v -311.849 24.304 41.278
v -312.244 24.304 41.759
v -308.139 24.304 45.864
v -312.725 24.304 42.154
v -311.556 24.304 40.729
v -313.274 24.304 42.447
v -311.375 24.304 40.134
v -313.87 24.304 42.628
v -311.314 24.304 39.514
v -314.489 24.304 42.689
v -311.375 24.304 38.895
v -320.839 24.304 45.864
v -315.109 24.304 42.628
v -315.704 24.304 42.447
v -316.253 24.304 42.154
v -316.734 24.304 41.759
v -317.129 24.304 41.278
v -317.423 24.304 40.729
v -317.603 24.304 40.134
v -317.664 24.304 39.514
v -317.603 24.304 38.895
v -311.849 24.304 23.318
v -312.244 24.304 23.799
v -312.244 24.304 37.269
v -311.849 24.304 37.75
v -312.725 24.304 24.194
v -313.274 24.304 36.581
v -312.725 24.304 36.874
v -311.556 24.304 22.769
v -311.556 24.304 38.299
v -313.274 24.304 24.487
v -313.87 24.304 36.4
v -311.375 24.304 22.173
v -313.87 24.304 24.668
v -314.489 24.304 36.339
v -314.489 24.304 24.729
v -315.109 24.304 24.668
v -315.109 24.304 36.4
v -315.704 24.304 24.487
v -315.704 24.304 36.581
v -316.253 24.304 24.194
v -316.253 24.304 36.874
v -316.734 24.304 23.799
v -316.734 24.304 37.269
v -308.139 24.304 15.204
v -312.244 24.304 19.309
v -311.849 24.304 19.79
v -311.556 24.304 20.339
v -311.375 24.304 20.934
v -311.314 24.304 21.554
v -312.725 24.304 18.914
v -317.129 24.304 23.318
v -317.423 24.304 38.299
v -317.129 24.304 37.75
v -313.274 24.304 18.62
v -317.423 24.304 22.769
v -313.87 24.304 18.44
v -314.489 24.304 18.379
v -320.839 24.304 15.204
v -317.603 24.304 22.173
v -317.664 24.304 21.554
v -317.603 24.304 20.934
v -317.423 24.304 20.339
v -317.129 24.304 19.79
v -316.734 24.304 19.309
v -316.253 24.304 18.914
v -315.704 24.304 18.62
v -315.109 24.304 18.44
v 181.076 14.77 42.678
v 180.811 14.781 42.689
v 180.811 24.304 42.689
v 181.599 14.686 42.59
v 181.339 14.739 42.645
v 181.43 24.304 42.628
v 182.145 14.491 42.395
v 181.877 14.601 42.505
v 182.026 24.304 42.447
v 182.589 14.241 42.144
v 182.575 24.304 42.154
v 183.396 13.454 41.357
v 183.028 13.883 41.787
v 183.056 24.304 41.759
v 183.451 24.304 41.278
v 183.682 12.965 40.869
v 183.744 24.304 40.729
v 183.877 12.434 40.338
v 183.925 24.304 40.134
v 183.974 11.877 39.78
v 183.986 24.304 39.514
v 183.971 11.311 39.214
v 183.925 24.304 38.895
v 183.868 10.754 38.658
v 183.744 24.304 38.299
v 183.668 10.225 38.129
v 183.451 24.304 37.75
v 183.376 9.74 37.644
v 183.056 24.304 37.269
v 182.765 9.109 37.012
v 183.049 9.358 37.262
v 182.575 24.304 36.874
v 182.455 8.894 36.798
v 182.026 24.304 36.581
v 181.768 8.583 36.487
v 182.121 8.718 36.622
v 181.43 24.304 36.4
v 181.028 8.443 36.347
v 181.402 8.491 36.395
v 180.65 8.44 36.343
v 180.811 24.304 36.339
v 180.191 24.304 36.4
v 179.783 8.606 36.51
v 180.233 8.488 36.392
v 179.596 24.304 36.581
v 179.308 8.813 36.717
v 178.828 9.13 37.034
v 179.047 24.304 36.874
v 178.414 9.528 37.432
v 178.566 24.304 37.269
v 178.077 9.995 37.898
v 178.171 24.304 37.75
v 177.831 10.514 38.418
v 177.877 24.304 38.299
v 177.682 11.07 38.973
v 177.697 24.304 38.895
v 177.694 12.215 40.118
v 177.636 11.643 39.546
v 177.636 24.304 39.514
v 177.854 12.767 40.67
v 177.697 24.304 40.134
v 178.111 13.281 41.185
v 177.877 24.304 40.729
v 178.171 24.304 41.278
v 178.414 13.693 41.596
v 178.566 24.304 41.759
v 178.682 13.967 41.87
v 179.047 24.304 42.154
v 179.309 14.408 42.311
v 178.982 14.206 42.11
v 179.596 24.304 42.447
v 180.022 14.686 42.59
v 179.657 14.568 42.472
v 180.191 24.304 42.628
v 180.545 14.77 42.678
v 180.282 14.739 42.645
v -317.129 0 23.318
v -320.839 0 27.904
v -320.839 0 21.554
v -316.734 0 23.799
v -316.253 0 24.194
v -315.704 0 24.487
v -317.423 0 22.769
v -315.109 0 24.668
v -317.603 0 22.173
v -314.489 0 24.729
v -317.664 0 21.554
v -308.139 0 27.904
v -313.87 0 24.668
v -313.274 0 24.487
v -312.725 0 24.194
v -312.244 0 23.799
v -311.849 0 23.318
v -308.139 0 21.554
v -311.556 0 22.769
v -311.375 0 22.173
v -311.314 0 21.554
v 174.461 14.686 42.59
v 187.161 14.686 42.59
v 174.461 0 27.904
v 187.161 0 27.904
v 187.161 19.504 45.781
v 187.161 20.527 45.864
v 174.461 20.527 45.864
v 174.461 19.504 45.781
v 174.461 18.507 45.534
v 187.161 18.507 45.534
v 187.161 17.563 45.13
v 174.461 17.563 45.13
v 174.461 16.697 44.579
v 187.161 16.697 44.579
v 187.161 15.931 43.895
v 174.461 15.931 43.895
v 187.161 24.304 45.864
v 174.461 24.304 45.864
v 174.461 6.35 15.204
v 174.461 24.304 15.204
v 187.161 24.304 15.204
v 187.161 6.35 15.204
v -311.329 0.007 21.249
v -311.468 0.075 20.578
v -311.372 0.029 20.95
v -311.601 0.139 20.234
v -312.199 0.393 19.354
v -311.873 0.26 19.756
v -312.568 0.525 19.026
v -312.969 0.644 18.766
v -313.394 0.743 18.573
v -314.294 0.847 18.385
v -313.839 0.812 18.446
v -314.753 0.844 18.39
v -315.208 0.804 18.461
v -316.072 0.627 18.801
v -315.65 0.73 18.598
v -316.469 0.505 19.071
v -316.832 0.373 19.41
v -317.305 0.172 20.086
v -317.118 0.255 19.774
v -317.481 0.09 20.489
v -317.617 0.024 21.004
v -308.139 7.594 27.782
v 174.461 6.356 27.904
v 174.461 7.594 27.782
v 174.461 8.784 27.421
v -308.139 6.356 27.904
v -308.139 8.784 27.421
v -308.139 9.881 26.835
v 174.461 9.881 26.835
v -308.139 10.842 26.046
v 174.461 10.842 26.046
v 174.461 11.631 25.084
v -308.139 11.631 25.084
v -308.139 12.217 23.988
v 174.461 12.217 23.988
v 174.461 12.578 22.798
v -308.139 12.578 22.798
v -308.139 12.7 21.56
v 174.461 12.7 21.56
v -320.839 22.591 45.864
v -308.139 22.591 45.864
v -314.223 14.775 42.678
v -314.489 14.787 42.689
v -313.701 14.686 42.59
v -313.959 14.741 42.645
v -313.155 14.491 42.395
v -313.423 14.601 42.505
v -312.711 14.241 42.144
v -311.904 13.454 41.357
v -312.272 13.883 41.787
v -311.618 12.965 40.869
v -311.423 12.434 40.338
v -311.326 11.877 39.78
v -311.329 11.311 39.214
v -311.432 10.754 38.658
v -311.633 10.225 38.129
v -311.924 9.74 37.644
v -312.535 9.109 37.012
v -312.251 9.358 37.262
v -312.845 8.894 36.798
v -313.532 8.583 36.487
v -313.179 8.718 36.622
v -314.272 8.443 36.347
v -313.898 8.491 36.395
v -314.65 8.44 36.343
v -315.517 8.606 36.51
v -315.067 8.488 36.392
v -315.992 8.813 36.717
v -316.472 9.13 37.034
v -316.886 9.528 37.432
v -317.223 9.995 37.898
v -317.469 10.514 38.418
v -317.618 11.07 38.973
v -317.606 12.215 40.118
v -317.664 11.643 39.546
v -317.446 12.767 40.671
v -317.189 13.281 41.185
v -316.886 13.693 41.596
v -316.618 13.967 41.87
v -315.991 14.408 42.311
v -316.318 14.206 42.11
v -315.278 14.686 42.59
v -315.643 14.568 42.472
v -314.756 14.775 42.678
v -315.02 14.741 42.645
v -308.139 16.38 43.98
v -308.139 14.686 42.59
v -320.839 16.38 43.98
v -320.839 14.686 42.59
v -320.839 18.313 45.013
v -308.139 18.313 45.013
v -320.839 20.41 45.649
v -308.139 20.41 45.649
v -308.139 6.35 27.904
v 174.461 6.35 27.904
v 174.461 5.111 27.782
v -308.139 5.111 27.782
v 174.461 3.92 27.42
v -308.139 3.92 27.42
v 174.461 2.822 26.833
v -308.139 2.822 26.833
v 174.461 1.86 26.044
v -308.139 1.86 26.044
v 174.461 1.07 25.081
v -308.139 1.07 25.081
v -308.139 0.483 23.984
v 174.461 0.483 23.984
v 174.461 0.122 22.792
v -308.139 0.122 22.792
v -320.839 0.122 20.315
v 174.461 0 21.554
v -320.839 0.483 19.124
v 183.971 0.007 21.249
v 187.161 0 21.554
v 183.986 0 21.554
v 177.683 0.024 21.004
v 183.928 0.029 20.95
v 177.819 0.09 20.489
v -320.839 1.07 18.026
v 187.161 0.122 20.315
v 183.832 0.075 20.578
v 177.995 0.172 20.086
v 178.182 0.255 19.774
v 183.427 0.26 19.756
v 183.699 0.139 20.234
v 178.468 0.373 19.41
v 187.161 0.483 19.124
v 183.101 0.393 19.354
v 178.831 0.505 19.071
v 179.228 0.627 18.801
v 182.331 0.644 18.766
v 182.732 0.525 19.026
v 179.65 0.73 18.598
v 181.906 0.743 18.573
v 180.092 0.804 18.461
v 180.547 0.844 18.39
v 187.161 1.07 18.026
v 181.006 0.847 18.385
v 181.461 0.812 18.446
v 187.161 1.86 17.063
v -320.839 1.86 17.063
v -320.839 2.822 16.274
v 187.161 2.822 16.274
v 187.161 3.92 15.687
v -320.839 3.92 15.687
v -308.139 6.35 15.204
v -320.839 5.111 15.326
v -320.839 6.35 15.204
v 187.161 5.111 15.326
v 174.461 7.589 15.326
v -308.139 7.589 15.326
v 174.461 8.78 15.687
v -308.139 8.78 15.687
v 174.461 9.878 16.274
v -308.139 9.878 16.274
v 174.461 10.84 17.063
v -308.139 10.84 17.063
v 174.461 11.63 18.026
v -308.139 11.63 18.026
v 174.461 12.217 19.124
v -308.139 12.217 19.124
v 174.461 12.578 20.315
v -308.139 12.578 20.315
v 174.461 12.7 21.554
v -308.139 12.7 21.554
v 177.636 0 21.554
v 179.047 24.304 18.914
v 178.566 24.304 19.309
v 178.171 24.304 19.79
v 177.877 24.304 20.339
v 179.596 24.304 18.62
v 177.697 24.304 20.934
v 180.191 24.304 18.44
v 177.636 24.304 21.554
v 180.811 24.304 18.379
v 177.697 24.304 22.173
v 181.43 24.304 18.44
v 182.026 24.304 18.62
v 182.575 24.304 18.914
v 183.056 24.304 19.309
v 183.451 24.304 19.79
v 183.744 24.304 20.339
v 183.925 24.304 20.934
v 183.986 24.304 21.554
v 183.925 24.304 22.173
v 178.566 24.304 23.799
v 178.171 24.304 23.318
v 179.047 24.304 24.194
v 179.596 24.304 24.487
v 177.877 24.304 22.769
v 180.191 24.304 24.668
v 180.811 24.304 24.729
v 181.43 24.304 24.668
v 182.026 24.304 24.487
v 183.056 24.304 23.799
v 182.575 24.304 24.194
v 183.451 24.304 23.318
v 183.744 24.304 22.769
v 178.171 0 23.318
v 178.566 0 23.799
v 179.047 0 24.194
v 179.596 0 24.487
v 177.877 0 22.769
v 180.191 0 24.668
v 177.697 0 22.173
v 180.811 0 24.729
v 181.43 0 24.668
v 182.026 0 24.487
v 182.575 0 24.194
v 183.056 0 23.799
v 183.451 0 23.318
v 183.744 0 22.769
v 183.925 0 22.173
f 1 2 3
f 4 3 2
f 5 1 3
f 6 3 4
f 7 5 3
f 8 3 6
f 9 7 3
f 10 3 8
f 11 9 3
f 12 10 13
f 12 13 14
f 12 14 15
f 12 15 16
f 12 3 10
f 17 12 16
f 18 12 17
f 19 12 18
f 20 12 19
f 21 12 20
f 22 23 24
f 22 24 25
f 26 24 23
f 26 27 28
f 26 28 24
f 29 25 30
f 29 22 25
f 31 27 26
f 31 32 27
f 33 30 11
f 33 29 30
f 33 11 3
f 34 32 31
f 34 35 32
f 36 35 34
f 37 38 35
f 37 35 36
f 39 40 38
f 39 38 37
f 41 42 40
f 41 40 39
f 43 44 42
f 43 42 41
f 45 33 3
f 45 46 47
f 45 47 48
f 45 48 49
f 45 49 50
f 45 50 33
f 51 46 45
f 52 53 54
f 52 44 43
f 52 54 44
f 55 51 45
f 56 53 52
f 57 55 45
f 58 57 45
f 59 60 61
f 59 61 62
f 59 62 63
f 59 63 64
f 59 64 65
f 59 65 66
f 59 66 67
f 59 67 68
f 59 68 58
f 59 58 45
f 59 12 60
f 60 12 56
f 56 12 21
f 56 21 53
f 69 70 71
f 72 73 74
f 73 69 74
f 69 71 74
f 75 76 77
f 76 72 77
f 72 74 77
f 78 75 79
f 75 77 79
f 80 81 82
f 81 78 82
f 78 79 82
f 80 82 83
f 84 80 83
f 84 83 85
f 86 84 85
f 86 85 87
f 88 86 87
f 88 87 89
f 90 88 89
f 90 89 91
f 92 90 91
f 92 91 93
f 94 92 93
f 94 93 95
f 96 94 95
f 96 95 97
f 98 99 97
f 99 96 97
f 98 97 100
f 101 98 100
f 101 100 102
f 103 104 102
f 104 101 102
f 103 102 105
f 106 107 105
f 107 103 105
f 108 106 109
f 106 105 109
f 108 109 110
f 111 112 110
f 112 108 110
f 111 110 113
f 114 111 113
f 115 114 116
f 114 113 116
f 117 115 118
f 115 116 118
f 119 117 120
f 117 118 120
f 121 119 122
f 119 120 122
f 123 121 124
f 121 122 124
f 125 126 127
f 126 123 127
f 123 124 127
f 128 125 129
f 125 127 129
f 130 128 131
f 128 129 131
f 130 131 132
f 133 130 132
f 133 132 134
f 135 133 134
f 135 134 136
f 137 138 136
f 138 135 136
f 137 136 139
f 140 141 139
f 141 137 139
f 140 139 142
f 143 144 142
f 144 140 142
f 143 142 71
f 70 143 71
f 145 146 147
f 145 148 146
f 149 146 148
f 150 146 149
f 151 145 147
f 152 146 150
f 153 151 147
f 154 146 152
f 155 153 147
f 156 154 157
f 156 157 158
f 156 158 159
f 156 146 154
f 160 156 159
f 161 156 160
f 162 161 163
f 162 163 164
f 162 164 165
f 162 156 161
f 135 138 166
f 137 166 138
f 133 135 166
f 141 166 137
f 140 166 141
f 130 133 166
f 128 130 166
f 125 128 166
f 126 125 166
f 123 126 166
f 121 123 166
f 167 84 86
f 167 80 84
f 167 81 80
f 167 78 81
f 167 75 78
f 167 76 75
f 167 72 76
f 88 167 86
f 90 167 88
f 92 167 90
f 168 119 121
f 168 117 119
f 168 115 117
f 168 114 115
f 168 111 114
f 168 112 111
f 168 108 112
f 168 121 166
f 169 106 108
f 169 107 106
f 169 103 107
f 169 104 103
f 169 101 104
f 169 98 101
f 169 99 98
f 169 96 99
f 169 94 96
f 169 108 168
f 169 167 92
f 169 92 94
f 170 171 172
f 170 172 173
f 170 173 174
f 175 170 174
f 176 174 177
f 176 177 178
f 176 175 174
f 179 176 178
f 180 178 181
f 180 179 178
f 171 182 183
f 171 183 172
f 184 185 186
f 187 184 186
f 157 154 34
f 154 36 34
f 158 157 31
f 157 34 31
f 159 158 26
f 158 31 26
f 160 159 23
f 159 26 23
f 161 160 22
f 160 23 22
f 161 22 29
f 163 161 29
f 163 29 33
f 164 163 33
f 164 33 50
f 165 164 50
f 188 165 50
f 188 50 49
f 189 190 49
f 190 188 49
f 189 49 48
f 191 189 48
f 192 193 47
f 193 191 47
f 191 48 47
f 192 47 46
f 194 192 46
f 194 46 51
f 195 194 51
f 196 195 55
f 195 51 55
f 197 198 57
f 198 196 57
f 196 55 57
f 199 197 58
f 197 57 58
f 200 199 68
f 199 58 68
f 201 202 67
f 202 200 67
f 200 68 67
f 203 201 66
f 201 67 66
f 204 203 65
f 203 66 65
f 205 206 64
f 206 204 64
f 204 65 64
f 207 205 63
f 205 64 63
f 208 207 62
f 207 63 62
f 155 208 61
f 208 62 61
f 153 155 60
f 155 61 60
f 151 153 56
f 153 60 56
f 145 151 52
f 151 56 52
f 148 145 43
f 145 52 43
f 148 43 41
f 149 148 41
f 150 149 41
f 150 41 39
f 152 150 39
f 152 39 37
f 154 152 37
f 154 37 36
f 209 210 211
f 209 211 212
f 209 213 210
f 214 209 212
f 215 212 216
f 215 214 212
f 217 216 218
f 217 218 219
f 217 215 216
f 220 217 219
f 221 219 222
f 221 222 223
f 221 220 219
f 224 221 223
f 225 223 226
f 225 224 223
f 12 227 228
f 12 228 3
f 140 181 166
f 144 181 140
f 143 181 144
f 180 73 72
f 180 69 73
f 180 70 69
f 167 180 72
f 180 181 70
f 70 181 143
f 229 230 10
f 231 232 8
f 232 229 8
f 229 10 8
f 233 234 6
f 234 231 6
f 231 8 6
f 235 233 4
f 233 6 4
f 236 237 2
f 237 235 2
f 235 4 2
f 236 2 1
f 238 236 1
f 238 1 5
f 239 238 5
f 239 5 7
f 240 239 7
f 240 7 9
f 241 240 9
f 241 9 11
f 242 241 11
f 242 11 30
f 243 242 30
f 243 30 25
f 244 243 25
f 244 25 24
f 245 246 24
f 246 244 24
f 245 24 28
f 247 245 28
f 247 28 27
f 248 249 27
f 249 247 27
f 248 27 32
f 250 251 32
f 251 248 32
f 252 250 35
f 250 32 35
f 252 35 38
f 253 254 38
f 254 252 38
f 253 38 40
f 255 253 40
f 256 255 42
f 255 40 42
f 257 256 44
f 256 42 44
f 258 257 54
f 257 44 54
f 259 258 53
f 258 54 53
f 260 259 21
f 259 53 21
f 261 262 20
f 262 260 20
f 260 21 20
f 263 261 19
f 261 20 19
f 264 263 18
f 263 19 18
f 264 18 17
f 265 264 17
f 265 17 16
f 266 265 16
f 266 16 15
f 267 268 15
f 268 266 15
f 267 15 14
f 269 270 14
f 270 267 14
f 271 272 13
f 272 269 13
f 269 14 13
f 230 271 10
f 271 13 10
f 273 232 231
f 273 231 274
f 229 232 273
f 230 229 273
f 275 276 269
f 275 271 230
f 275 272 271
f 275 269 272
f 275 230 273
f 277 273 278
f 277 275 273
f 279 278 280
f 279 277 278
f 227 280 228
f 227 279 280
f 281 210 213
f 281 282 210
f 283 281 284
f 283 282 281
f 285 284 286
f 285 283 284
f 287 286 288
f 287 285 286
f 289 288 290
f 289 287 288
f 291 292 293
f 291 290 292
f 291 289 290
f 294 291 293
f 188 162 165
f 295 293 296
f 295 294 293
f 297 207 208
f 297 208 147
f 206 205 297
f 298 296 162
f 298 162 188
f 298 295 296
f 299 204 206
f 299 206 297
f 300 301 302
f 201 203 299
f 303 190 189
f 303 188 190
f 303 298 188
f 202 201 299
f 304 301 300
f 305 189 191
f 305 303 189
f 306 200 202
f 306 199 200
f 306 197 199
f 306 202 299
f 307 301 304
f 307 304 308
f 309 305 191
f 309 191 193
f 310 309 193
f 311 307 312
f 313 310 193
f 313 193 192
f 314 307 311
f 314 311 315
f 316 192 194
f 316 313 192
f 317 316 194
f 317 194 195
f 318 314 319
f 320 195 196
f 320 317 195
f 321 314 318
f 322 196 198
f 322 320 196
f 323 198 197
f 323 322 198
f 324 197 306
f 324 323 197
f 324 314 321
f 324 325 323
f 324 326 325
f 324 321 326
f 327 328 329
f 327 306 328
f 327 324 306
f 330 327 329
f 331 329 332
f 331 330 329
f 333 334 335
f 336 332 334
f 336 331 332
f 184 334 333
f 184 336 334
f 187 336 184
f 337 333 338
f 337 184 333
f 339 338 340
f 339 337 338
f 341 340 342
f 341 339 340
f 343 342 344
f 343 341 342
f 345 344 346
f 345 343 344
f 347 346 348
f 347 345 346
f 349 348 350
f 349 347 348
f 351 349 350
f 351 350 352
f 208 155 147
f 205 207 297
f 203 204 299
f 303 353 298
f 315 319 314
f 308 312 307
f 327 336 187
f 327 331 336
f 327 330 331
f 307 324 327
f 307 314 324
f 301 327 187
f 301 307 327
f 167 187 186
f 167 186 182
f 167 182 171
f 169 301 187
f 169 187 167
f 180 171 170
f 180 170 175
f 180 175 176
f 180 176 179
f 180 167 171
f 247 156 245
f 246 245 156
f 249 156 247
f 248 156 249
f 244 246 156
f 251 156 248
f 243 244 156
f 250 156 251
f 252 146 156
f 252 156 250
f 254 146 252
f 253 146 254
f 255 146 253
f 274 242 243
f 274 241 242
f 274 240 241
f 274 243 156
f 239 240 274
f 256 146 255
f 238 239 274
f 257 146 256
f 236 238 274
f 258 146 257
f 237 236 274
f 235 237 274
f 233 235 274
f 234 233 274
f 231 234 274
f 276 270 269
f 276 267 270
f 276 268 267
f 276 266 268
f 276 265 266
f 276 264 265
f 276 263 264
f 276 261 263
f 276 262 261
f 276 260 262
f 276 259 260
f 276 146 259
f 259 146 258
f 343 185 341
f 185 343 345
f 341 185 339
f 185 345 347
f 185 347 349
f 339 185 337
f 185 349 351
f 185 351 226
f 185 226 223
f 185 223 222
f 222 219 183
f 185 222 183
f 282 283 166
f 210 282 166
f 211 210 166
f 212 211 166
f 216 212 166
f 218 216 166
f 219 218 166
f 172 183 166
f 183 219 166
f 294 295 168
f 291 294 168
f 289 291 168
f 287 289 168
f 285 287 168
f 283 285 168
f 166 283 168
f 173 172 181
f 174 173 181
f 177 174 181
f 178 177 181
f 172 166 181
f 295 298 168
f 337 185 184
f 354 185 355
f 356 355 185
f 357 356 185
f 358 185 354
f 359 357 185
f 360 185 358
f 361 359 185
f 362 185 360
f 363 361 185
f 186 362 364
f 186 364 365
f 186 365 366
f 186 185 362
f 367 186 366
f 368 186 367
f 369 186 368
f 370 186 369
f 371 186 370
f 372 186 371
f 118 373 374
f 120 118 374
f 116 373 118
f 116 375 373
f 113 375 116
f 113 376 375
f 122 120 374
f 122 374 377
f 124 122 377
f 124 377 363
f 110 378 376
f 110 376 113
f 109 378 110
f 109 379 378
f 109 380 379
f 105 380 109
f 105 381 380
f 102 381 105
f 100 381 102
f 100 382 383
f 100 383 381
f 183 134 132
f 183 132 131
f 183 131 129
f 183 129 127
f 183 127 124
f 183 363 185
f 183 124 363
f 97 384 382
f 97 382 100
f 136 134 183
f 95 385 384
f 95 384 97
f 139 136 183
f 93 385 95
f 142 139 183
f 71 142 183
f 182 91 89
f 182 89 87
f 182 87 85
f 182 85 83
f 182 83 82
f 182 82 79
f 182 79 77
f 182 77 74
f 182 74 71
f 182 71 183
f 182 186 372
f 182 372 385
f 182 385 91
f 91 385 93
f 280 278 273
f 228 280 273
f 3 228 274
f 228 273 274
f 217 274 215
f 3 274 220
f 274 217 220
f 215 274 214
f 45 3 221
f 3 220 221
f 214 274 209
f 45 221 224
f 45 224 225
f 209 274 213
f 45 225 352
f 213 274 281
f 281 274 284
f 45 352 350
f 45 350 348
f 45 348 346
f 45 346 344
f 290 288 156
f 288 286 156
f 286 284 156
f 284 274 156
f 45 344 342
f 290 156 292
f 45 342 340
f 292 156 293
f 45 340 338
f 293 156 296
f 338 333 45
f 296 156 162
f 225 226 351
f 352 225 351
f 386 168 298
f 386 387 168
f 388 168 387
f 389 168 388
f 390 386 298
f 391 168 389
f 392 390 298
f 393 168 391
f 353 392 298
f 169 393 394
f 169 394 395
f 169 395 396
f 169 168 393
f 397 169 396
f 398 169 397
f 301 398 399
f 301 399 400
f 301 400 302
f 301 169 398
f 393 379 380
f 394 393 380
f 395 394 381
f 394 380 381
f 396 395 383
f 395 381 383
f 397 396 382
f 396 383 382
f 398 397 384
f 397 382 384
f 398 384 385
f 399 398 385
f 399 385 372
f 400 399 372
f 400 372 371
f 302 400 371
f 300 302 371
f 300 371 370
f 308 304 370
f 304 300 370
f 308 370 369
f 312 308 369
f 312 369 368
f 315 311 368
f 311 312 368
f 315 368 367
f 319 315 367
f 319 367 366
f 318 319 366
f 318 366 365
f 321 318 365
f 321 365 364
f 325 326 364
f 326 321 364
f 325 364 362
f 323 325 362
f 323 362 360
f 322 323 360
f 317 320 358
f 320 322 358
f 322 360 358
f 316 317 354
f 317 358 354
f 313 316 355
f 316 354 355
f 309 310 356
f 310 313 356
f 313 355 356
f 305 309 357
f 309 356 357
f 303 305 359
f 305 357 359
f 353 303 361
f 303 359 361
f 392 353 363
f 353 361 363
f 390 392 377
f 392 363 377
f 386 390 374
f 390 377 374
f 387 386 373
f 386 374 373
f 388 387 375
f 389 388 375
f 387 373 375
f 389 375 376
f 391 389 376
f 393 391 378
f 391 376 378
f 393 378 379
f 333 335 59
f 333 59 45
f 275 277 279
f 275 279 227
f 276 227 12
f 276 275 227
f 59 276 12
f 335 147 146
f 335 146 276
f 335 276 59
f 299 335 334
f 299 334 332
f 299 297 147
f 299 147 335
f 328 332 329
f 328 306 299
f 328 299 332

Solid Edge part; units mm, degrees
sketch "Sketch1" plane through (0, 0, 0) normal (0, -1, 0) x (1, 0, 0)
  line L0 (187.1606, 27.9036) -> (-320.8394, 27.9036)
  line L1 (-320.8394, 27.9036) -> (-320.8394, 15.2036)
  line L2 (-320.8394, 15.2036) -> (187.1606, 15.2036)
  line L3 (187.1606, 15.2036) -> (187.1606, 27.9036)
extrude "Protrusion1" add sketch "Sketch1" against normal blind 12.7
sketch "Sketch2" plane through (-320.8394, 6.35, 21.5536) normal (-1, 0, 0) x (0, -1, 0)
  line L0 (6.35, 6.35) -> (-8.336, 21.036)
  arc A0 (-8.336, 21.036) -> (-16.2414, 24.3105) centre (-16.2414, 13.1305) ccw
  line L1 (-16.2414, 24.3105) -> (-17.9544, 24.3105)
  line L2 (-17.9544, 24.3105) -> (-17.9544, -6.35)
  line L3 (-17.9544, -6.35) -> (-6.35, -6.35)
extrude "ExtrudedProtrusion_2" add sketch "Sketch2" against normal blind 12.7 material side at (-320.8394, 7.3784, 35.2112)
sketch "Sketch3" plane through (187.1606, 6.35, 21.5536) normal (1, 0, 0) x (0, 1, 0)
  line L0 (8.336, 21.036) -> (-6.35, 6.35)
  line L1 (-6.35, 6.35) -> (-6.35, -6.35)
  line L2 (-6.35, -6.35) -> (17.9544, -6.35)
  line L3 (17.9544, -6.35) -> (17.9544, 23.4399)
  line L4 (17.9544, 23.4399) -> (17.9544, 24.3105)
  line L5 (17.9544, 24.3105) -> (14.1772, 24.3105)
  arc A0 (14.1772, 24.3105) -> (9.5809, 22.3419) centre (14.1772, 17.9605) ccw
  line L6 (9.5809, 22.3419) -> (8.336, 21.036)
extrude "ExtrudedProtrusion_3" add sketch "Sketch3" against normal blind 12.7
hole "Hole_1" at (180.8106, 24.3044, 39.5141) direction (0, -1, 0) diameter 6.35 end up to next
hole "Hole1" at (180.8106, 24.3044, 21.5536) direction (0, -1, 0) diameter 6.35 end up to next
hole "Hole_3" at (-314.4894, 24.3044, 39.5141) direction (0, -1, 0) diameter 6.35 end up to next
hole "Hole2" at (-314.4894, 24.3044, 21.5536) direction (0, -1, 0) diameter 6.35 end up to next
fillet "Round_1" radius 6.35 4 edges at (-66.8394, 0, 27.9036) (-66.8394, 12.7, 27.9036) (-66.8394, 0, 15.2036) (-66.8394, 12.7, 15.2036)
